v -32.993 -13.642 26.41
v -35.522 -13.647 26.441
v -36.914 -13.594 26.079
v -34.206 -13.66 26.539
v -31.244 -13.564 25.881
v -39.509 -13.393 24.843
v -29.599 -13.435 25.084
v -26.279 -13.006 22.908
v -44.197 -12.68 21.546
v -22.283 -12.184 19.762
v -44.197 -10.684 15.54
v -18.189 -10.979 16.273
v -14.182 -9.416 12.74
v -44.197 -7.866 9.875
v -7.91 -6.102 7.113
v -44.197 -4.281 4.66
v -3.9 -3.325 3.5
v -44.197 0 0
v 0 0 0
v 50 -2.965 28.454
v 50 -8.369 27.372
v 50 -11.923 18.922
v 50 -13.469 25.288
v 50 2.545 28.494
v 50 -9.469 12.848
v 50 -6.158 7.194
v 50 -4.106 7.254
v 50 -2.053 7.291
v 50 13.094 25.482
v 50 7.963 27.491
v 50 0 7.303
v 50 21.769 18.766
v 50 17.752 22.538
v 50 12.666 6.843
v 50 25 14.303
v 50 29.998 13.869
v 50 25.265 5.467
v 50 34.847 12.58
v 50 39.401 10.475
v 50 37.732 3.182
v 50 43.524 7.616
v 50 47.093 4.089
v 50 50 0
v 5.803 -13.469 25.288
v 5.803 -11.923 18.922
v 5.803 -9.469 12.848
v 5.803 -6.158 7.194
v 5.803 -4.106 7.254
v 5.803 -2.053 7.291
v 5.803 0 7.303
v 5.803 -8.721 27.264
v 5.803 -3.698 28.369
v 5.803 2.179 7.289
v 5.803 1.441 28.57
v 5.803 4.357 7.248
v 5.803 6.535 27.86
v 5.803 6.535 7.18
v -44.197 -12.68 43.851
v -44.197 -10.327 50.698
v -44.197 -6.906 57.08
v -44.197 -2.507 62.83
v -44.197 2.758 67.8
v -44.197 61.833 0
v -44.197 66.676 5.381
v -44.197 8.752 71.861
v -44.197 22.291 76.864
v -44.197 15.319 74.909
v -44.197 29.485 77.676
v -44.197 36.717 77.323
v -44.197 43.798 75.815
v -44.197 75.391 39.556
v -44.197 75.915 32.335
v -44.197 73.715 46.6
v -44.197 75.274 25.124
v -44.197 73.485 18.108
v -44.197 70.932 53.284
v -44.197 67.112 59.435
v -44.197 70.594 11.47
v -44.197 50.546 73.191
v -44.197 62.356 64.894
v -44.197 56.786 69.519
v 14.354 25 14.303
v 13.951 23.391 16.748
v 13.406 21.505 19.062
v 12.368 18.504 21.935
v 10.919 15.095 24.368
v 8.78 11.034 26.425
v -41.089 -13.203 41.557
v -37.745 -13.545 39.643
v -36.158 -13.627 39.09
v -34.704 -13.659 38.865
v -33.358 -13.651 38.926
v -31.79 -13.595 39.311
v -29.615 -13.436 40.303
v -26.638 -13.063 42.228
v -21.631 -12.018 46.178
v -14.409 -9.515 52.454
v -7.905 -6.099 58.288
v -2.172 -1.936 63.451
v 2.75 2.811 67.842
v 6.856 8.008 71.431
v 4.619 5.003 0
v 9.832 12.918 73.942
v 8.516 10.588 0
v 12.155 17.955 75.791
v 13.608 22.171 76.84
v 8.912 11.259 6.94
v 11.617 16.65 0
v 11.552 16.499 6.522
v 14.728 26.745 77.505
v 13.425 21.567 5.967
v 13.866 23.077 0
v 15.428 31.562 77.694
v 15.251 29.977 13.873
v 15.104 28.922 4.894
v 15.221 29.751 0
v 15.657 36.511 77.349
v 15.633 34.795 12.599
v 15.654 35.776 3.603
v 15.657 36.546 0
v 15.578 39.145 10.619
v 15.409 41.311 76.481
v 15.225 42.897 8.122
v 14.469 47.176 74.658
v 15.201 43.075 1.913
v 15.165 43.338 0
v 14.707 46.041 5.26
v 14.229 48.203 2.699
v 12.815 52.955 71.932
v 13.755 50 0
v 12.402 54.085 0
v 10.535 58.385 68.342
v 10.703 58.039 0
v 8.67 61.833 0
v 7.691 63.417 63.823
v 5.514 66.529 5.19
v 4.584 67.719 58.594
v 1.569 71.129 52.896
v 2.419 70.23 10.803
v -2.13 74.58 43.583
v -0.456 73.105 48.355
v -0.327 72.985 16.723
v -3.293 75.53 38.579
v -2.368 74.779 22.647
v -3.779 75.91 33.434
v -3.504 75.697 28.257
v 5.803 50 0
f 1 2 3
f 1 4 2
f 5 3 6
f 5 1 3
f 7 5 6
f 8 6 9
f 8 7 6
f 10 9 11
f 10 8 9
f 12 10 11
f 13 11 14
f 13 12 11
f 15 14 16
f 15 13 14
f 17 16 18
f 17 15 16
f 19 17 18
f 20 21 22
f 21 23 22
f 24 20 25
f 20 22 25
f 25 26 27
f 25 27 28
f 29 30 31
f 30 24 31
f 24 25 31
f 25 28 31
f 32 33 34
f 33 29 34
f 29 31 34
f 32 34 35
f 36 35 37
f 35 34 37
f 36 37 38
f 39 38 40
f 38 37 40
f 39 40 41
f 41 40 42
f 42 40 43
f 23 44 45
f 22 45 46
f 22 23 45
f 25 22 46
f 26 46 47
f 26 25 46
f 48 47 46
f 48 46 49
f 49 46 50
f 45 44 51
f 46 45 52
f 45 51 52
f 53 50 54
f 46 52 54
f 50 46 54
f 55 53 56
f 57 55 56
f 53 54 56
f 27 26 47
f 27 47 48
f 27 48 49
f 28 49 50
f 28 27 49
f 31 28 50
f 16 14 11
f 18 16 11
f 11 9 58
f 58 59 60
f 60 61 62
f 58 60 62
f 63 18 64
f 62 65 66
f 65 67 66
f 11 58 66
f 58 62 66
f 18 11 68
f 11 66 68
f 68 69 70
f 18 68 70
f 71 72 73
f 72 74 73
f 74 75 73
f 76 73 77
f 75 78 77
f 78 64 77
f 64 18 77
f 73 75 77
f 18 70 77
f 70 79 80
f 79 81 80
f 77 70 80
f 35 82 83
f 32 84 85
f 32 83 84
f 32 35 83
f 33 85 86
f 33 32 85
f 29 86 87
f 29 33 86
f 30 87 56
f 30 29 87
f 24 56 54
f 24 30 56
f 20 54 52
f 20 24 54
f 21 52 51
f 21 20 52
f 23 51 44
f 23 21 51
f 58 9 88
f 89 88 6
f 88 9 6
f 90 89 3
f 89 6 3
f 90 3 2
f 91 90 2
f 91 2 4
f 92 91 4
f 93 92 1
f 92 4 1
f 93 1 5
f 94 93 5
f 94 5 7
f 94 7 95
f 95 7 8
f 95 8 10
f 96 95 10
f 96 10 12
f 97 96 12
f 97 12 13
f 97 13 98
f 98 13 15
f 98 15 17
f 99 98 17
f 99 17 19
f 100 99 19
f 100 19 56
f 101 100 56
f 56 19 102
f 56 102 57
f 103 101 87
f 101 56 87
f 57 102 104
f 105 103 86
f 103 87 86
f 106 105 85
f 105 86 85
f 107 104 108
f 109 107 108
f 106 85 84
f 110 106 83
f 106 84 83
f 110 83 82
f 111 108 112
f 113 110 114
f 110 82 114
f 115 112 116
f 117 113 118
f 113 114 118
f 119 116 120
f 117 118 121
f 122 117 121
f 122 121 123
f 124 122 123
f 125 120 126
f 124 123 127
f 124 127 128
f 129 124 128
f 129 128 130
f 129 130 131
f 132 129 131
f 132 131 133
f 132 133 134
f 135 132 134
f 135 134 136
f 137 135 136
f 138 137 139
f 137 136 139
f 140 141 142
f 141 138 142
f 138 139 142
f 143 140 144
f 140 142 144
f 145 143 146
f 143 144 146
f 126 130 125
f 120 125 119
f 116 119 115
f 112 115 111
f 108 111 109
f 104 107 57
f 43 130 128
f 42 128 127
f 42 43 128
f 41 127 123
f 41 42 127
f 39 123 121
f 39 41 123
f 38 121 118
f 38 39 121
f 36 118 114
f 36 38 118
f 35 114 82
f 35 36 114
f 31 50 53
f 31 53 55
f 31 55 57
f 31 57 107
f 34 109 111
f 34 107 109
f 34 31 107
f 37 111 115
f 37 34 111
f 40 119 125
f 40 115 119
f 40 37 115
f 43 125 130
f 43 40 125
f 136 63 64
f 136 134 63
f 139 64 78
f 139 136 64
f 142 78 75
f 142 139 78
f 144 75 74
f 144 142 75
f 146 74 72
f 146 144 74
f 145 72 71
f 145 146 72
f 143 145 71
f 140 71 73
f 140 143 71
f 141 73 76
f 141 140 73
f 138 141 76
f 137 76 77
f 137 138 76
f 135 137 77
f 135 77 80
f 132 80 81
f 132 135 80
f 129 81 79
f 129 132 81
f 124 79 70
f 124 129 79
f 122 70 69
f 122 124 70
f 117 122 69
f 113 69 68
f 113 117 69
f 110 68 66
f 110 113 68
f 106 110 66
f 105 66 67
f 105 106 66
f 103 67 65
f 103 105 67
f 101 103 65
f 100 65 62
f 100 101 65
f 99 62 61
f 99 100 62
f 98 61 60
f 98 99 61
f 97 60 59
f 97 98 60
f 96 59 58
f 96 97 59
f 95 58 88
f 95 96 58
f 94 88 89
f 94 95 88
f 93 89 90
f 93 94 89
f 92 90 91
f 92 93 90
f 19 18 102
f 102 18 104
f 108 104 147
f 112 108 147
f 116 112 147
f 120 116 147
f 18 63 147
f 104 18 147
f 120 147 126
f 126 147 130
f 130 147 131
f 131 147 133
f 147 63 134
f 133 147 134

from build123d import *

# Parameters (mm, degrees)
F0_W     = 100
F0_H     = 100
F2_DEPTH = 52
F4_DEPTH = 50
F5_R     = 50
F6_DEPTH = 100
F7_R     = 45
F8_DEPTH = 100


with BuildPart() as f2:
    # F0 (on Top) → F2 (new body)
    with BuildSketch(Plane.XY):
        Rectangle(F0_W, F0_H)
    extrude(amount=F2_DEPTH)

    # F3 (on offset) → F4 (intersect)
    with BuildSketch(Plane.YZ.offset(55.802872)):
        with BuildLine():
            ThreePointArc((25, 14.303062), (0, 28.606123), (-25, 14.303062))
            ThreePointArc((-25, 14.303062), (-39.401194, 10.474585), (-50, 0))
            ThreePointArc((-50, 0), (-25.265238, 5.467368), (0, 7.302669))
            ThreePointArc((0, 7.302669), (25.265238, 5.467368), (50, 0))
            ThreePointArc((50, 0), (39.401194, 10.474585), (25, 14.303062))
        make_face()
    extrude(amount=-F4_DEPTH, mode=Mode.INTERSECT)

    # F5 (on Top) → F6 (join)
    with BuildSketch(Plane.XY):
        with Locations((-34.342921, 36.339563)):
            Circle(F5_R)
    extrude(amount=F6_DEPTH)

    # F7 (on offset) → F8 (intersect)
    with BuildSketch(Plane.YZ.offset(55.802872)):
        with Locations((30.916278, 32.698375)):
            Circle(F7_R)
    extrude(amount=-F8_DEPTH, mode=Mode.INTERSECT)


solid = f2.part
